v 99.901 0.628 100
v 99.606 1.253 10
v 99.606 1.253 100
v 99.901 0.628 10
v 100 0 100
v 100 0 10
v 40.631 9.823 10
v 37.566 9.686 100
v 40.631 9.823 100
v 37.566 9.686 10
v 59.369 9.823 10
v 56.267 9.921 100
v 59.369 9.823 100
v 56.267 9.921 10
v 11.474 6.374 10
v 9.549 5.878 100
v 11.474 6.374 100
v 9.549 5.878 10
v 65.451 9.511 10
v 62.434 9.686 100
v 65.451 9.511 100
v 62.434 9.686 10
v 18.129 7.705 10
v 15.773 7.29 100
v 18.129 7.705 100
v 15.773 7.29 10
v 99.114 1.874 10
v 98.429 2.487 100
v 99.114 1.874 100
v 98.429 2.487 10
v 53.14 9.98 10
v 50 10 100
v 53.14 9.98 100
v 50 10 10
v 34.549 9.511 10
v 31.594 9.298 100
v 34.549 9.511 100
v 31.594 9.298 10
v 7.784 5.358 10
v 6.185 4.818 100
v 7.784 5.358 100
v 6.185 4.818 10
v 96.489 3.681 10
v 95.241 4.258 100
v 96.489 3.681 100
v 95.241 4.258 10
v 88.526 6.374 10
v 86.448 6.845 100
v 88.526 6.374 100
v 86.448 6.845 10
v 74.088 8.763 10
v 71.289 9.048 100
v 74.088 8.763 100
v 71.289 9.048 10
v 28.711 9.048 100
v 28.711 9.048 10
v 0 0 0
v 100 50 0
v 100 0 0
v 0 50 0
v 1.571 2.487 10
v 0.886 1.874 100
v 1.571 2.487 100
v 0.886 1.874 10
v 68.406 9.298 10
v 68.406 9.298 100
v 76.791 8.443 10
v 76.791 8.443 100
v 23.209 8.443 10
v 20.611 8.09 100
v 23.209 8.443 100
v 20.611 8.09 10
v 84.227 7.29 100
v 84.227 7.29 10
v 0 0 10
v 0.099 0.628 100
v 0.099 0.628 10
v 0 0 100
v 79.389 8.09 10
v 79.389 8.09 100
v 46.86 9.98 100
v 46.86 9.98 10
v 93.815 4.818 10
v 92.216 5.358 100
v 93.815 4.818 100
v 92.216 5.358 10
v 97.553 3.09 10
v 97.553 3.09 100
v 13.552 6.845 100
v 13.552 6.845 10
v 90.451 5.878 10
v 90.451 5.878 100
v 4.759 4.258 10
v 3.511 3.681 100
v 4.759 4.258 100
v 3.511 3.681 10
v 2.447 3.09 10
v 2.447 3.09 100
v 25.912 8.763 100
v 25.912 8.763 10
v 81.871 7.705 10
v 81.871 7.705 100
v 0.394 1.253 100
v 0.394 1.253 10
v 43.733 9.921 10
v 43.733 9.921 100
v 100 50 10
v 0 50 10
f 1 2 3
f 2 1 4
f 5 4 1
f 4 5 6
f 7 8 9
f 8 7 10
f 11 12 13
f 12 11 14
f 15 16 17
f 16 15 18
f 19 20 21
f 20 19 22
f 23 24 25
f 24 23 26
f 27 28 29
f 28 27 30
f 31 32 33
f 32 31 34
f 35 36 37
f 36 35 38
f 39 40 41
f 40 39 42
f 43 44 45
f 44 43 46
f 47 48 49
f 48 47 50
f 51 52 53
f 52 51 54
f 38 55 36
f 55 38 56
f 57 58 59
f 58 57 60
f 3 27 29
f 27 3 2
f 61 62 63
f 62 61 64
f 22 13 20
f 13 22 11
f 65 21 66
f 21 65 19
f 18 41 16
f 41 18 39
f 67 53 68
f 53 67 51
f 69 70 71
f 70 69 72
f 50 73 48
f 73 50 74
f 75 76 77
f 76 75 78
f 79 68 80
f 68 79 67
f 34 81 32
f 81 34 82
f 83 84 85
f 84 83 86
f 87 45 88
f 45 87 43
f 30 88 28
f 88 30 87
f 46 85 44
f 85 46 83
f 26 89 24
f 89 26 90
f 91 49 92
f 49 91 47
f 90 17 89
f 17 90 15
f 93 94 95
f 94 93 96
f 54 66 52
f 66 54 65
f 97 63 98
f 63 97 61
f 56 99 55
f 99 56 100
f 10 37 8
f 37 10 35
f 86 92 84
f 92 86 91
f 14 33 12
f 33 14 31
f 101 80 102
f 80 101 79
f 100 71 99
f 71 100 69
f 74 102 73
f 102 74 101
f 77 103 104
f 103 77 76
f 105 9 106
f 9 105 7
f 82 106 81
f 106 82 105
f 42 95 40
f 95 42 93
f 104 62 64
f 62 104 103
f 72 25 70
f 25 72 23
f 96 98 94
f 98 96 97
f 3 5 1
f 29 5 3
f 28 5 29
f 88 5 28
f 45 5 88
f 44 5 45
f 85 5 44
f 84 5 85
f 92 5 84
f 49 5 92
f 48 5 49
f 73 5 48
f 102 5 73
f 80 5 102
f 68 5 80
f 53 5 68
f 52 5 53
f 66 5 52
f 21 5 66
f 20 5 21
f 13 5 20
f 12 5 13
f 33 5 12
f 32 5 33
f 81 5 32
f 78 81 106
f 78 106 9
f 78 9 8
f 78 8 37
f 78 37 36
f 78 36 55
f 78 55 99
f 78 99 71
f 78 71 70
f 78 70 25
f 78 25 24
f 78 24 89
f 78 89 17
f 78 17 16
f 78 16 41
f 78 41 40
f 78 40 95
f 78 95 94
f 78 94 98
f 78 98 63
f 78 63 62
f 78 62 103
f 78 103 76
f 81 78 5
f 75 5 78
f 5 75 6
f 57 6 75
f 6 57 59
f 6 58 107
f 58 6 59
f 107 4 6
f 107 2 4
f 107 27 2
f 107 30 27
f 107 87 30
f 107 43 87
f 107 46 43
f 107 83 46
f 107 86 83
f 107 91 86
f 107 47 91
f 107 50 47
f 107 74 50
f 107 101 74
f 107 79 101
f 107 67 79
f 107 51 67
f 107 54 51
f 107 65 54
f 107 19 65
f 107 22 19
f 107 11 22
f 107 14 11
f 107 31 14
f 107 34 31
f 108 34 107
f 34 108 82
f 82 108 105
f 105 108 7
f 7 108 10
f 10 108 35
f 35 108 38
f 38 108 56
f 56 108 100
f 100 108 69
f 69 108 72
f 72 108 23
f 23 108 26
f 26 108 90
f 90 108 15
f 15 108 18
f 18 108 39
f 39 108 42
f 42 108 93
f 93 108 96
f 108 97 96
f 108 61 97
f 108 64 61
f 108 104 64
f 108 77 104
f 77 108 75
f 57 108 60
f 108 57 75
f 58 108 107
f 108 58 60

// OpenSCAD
wallWidth=100;
wallHeight=50;
wallThick=10;
neckWidth=100;
neckHeight=20;
neckLength=100;

cube([wallWidth, wallHeight, wallThick]);
difference(){
    translate([wallWidth/2, 0, 0]){
        scale([neckWidth*0.1, neckHeight*0.1, 1]) cylinder(h=neckLength, d=10, $fn=100);
    }
    translate([0, -wallHeight, 0]){
        cube([wallWidth, wallHeight, neckLength]);
    }
}
